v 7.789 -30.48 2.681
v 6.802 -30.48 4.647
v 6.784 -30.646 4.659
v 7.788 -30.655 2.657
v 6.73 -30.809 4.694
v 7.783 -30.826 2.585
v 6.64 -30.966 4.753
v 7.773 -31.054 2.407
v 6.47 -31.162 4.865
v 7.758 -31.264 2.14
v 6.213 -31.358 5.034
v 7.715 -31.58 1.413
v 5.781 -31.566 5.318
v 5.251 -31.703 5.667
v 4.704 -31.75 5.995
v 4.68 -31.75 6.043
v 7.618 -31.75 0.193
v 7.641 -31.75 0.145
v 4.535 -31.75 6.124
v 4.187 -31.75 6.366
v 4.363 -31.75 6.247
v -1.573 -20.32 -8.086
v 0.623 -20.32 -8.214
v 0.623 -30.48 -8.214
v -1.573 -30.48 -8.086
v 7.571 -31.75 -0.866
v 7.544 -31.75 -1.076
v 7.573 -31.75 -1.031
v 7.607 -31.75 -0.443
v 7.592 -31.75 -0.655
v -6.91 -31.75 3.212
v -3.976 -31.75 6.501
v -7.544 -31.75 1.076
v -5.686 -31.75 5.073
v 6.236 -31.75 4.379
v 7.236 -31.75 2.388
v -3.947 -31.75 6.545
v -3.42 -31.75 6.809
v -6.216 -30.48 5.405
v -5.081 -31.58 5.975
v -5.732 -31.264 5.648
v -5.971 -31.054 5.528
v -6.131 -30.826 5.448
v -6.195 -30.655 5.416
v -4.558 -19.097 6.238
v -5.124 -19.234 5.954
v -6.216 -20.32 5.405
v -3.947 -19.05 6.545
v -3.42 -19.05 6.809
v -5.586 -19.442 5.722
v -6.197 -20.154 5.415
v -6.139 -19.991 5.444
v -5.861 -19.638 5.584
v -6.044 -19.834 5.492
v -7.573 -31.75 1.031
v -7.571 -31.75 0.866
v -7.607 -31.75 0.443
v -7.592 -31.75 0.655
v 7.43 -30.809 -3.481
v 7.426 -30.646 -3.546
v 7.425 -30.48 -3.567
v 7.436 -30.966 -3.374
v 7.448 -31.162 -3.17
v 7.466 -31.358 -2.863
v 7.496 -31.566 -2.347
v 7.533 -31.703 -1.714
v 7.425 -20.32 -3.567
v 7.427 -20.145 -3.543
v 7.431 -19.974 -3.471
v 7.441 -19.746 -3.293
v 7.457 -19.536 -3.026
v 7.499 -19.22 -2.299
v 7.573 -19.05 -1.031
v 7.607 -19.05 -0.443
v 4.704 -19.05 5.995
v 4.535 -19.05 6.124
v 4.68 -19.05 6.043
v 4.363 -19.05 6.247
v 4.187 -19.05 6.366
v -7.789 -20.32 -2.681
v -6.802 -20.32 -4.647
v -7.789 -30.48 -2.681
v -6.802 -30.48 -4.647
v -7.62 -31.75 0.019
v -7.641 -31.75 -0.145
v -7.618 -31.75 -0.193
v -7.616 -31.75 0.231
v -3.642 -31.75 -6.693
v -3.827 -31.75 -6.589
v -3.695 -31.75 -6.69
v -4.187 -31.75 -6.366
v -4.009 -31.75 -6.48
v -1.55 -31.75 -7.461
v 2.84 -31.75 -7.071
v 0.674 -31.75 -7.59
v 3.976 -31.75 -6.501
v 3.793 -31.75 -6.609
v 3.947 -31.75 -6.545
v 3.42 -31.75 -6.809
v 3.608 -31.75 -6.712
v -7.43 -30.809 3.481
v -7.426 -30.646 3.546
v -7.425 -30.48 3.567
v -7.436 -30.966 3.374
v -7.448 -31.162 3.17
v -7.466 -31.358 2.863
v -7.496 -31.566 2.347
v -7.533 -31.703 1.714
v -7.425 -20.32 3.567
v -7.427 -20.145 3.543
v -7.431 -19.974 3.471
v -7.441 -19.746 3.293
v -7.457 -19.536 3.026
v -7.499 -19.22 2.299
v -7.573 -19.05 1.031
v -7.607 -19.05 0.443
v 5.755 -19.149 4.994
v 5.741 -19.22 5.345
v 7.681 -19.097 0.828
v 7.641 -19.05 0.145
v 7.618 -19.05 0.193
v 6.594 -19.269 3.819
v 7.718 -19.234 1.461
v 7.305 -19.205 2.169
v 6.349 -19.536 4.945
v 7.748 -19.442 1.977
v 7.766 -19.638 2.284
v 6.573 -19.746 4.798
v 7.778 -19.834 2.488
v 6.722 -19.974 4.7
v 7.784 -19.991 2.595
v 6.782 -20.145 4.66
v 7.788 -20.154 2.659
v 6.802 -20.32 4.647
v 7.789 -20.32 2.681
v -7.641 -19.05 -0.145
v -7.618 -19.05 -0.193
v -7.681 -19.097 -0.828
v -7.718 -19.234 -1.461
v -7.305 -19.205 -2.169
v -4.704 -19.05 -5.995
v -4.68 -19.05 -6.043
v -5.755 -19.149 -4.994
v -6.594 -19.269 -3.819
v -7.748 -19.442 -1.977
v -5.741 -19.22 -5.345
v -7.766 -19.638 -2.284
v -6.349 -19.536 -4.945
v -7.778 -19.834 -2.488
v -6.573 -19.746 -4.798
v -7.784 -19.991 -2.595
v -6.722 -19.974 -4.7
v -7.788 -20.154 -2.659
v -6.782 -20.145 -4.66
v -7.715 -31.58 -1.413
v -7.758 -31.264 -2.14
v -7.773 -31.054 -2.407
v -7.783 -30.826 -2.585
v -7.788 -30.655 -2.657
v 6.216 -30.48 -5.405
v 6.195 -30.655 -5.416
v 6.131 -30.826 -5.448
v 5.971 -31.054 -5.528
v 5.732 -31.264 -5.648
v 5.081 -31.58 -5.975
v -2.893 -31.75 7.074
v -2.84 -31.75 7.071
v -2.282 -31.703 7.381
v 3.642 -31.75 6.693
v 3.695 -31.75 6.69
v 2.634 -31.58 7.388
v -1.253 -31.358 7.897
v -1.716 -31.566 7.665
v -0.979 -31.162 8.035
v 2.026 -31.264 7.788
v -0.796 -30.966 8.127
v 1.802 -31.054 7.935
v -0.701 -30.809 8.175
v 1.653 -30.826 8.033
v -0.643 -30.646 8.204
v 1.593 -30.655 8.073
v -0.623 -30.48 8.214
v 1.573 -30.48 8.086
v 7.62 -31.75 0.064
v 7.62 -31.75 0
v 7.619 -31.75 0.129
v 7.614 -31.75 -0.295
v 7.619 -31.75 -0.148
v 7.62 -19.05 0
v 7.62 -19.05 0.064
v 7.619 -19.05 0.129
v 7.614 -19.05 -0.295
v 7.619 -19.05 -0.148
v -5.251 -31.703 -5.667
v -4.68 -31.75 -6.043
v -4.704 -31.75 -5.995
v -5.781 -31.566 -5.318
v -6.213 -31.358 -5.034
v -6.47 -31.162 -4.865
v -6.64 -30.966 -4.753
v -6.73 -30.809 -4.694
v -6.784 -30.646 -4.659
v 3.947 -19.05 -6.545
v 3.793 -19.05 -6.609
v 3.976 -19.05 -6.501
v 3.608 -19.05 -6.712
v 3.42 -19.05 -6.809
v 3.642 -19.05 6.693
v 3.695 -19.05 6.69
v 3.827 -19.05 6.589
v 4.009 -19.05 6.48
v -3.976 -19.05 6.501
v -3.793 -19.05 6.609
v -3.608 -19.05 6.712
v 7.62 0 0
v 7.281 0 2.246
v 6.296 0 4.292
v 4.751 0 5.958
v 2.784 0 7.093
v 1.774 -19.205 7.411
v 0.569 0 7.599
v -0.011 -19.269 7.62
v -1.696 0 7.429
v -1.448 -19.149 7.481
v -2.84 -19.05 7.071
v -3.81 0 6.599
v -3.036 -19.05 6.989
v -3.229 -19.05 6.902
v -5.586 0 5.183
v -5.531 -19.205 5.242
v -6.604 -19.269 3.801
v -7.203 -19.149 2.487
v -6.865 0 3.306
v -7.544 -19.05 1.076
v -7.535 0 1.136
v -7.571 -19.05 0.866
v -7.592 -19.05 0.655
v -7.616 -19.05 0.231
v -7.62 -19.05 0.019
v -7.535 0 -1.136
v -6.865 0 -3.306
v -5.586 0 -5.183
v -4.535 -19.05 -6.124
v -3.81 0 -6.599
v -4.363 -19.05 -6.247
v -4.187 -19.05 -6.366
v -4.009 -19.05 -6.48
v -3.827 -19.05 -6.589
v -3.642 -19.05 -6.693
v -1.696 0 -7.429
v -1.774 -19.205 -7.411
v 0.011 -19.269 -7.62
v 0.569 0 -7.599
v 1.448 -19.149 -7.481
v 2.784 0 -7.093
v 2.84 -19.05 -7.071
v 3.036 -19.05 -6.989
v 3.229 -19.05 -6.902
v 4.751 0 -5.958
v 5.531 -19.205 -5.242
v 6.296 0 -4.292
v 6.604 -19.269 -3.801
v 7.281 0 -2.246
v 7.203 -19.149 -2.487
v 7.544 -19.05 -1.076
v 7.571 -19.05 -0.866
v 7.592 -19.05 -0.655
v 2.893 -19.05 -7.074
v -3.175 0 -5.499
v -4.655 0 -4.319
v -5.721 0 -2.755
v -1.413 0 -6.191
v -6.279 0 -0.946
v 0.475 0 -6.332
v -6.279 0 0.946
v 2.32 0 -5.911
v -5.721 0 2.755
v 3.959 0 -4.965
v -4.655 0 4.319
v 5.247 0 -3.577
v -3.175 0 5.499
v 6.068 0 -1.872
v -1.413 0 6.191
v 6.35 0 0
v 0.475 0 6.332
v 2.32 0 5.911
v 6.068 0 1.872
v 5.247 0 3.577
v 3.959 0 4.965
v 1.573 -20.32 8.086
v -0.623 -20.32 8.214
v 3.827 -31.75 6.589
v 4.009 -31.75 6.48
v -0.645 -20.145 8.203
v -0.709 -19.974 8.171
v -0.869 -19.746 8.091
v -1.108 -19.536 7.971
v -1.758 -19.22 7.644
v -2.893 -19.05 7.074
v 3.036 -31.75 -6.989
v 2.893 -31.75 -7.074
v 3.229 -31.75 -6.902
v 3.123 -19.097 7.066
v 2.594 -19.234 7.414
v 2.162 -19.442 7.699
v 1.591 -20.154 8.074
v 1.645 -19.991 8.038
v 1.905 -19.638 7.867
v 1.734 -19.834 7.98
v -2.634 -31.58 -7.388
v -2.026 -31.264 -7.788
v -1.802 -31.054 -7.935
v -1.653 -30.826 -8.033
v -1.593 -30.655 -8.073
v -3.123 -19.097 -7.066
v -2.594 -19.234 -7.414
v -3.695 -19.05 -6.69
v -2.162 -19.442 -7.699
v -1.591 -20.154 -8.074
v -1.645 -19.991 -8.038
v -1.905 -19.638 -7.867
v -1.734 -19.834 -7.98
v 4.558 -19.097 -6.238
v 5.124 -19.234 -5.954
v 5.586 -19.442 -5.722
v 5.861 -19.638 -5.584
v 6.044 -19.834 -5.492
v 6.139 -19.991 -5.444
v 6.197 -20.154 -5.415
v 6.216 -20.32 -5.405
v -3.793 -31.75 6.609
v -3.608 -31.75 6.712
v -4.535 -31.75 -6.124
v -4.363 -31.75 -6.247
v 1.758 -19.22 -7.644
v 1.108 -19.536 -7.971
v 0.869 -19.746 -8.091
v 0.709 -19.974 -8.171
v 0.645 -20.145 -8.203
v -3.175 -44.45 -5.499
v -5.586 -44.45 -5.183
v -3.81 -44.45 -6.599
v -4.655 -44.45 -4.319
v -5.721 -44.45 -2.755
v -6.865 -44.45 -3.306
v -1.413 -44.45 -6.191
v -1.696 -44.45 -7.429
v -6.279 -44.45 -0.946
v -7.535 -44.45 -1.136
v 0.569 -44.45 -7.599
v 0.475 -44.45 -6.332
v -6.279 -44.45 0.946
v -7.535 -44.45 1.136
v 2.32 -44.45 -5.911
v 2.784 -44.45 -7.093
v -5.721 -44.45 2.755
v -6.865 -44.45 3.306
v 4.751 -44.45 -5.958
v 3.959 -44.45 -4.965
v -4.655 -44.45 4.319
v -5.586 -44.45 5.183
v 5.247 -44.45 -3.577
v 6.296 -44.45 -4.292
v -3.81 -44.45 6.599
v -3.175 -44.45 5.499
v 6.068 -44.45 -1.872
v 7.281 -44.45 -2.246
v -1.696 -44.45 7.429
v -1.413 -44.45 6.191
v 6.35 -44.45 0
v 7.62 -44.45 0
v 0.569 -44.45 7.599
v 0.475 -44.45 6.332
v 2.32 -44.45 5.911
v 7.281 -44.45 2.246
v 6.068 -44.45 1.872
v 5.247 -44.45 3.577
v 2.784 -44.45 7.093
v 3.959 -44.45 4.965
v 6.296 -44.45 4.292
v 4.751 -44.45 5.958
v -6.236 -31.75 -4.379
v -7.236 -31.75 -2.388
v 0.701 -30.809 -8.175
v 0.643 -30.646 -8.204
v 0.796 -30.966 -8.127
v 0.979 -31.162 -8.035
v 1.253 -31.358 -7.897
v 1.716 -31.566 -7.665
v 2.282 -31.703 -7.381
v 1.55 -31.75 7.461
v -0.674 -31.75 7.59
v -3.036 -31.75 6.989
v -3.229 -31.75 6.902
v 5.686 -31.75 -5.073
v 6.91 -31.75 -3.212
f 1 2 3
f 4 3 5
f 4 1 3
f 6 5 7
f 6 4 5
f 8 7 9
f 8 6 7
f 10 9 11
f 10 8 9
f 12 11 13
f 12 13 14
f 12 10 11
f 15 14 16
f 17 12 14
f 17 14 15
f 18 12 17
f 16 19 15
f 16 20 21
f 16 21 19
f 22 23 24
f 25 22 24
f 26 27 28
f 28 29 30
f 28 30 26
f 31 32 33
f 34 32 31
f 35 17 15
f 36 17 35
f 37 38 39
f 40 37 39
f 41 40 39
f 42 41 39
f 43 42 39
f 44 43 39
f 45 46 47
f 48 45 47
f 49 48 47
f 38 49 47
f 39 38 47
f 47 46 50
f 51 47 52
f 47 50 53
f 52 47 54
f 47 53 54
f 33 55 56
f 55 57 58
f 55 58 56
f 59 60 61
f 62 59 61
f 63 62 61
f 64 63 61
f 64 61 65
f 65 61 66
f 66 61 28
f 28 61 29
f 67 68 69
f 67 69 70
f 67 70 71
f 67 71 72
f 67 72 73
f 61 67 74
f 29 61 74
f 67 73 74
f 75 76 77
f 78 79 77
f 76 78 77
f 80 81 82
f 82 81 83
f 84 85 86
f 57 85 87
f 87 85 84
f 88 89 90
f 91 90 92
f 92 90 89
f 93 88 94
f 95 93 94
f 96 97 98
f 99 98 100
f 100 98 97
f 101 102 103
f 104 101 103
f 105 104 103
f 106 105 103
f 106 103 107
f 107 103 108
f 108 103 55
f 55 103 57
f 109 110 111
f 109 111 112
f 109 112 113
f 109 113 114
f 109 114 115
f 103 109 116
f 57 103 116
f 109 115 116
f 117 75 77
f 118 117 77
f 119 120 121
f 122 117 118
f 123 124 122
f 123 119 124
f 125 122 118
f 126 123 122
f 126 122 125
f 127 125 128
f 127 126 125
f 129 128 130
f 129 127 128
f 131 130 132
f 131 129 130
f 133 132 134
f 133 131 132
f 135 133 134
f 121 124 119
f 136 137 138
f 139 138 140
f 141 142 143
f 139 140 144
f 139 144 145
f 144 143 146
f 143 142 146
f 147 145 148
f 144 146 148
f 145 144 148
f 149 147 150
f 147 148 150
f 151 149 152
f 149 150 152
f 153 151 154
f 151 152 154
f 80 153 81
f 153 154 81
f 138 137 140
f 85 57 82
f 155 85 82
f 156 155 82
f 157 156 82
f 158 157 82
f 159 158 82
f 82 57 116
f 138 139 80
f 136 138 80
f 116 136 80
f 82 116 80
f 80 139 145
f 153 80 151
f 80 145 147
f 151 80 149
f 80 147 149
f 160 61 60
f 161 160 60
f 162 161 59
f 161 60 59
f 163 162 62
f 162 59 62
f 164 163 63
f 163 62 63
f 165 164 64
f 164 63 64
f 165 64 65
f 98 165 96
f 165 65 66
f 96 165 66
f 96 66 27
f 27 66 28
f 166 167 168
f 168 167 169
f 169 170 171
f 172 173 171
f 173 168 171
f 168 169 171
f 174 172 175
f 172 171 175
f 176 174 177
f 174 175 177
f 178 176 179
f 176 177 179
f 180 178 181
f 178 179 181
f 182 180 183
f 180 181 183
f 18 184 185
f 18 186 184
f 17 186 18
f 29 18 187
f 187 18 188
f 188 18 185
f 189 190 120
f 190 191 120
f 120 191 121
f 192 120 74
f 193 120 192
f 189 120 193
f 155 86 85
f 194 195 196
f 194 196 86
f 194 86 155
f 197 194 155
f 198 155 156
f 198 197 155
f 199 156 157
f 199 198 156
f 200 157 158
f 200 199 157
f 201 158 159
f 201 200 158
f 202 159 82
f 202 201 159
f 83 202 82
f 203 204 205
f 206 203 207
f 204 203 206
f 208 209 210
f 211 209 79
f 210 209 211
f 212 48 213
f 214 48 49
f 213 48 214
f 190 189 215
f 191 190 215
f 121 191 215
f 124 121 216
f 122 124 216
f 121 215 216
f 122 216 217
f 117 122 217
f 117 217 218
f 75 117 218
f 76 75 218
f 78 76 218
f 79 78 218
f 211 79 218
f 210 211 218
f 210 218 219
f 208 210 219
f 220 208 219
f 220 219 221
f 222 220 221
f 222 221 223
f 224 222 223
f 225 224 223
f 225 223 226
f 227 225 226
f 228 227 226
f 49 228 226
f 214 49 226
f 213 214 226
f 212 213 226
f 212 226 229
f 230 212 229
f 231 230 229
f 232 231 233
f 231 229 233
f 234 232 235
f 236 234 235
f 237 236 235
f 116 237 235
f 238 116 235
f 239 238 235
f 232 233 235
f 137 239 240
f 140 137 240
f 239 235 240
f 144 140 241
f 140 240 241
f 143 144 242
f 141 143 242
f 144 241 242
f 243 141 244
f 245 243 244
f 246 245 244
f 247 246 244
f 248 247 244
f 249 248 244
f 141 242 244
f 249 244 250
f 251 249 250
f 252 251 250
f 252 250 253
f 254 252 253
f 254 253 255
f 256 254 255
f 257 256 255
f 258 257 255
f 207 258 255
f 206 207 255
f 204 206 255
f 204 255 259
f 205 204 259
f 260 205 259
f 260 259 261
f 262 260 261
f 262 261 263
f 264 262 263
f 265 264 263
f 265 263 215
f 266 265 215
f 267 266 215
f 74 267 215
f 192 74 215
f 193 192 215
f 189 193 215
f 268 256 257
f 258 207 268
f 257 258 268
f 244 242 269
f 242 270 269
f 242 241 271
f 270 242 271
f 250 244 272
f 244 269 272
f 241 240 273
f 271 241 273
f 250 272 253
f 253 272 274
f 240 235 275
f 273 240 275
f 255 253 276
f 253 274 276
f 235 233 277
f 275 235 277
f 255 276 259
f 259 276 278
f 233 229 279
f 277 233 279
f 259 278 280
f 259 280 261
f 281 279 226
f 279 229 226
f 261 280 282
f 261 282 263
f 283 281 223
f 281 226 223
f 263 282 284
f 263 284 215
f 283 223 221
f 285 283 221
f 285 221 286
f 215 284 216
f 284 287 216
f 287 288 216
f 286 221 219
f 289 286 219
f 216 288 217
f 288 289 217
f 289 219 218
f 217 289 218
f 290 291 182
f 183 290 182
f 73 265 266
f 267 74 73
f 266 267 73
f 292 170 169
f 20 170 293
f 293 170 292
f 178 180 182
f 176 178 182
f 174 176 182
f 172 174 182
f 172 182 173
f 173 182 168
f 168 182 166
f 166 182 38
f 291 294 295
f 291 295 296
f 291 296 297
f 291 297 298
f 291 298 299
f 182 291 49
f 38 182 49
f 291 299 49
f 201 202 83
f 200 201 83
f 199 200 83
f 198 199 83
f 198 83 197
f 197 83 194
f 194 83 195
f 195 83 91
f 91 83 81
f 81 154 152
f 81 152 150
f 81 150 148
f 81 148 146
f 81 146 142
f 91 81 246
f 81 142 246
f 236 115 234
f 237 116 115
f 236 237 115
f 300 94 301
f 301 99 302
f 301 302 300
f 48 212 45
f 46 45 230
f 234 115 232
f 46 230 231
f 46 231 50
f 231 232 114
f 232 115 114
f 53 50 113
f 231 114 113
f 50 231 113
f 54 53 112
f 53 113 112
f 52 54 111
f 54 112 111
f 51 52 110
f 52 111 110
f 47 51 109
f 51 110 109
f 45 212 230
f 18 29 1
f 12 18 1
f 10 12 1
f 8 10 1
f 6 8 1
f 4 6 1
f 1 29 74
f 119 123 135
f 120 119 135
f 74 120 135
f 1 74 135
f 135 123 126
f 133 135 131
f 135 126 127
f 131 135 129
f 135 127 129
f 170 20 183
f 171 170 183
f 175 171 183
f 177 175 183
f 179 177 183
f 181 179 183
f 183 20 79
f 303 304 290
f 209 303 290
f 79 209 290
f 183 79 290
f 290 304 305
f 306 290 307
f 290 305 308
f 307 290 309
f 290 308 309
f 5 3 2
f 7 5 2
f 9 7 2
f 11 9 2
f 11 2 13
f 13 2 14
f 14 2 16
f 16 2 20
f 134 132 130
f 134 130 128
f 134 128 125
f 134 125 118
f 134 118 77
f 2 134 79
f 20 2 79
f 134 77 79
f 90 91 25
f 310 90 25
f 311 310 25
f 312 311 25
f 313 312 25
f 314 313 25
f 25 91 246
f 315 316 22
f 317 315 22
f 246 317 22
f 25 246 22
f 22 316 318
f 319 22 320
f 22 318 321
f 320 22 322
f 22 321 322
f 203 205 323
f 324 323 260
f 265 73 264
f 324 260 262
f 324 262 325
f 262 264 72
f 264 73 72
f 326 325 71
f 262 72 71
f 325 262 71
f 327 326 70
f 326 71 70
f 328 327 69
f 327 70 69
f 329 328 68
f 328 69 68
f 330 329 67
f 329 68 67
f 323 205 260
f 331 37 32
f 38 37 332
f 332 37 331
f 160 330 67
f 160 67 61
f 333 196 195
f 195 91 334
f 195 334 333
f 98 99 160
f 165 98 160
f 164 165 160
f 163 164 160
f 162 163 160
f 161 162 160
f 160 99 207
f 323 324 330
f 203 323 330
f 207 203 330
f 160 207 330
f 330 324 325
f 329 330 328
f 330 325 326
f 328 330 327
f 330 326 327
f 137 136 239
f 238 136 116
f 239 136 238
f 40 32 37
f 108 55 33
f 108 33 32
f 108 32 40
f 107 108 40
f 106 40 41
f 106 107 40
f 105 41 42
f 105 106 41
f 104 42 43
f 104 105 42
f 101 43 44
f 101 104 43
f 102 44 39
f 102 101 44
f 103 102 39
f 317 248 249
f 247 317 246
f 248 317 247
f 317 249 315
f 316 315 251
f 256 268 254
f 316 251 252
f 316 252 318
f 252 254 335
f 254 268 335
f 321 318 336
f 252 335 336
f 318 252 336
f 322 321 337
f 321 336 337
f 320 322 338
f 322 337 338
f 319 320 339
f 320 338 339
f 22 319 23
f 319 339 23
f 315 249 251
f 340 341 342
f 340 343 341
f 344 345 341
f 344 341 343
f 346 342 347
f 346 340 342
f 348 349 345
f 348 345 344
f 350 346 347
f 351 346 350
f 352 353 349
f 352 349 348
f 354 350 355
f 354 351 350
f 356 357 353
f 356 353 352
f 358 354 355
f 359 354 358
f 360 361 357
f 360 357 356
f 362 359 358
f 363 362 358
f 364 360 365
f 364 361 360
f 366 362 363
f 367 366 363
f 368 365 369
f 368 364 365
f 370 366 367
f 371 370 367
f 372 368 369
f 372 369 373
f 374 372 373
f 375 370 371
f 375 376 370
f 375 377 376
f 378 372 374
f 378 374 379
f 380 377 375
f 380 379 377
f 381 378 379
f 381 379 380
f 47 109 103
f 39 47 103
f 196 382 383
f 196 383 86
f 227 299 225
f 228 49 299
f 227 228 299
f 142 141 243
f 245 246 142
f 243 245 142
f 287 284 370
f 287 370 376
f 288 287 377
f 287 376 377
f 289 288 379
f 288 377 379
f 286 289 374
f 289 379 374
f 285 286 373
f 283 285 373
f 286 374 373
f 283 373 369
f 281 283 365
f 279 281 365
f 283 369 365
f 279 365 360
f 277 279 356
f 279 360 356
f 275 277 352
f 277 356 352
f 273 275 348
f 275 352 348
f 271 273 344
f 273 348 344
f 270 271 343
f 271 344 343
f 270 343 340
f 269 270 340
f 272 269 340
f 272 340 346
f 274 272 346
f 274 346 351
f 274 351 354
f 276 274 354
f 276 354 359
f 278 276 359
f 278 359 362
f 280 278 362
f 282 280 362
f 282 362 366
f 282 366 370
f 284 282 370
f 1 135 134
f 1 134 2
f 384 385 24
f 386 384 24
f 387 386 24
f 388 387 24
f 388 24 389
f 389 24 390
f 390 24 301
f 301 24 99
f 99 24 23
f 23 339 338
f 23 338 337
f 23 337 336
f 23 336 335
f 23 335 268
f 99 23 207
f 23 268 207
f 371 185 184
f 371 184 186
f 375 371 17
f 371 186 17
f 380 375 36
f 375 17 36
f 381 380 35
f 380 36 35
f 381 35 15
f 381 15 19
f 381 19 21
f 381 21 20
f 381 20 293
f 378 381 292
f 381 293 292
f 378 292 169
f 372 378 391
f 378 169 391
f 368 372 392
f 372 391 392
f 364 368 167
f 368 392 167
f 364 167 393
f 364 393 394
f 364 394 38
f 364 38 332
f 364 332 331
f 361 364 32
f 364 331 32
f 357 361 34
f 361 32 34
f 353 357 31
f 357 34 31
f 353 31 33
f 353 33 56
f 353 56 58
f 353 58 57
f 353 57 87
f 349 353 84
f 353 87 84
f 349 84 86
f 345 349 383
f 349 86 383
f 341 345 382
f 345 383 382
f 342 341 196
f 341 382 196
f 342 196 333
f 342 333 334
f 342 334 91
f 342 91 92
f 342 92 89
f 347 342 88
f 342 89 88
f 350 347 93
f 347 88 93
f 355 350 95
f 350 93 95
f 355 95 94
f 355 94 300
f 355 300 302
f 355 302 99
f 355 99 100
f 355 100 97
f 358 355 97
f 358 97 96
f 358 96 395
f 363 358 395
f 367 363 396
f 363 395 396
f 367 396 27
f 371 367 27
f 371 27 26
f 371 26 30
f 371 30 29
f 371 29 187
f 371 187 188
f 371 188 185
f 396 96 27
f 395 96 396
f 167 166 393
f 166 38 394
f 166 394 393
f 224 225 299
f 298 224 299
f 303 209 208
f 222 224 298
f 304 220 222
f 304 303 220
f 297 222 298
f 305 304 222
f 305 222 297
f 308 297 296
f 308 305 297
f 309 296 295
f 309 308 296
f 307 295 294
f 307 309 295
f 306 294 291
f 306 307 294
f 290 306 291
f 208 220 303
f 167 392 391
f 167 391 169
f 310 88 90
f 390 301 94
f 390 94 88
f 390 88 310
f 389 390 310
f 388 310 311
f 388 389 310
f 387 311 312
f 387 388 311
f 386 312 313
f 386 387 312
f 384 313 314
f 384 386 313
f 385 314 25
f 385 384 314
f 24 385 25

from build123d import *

# Parameters (mm, degrees)
F0_R         = 7.62
F1_DEPTH     = 19.05
F3_DEPTH     = 12.7
F4_SIZE      = 1.27
F5_T1_DEPTH  = 8.5497045256
F5_T3_DEPTH  = 8.5497045256
F5_T5_DEPTH  = 8.5497045256
F5_T7_DEPTH  = 8.5497045256
F5_T12_DEPTH = 8.5497045256
F5_S13_R     = 7.62
F5_T14_DEPTH = 6
F5_T18_DEPTH = 8.5497045256
F5_S19_R     = 7.62
F5_T20_DEPTH = 6
F5_T24_DEPTH = 8.5497045256
F5_S25_R     = 7.62
F5_T26_DEPTH = 6
F5_T30_DEPTH = 8.5497045256
F5_S31_R     = 7.62
F5_T32_DEPTH = 6
F5_T36_DEPTH = 8.5497045256
F5_S37_R     = 7.62
F5_T38_DEPTH = 6
F5_T42_DEPTH = 8.5497045256
F5_S43_R     = 7.62
F5_T44_DEPTH = 6
F6_R         = 7.62
F7_DEPTH     = 12.7
F8_R         = 6.35
F9_DEPTH     = 44.4510001


# Not quite as in the source:
# - a fillet or chamfer that OpenCascade refuses, or shapes differently, is made with other operations: its cross-section is extruded or revolved along the edge and cut away or added


with BuildPart() as f1:
    # F0 (on Front) → F1 (new body)
    with BuildSketch(Plane.XZ):
        Circle(F0_R)
    extrude(amount=F1_DEPTH)

    # F2 (on face) → F3 (join)
    with BuildSketch(Plane.XZ.offset(19.05)):
        with BuildLine():
            Line((7.8629215405, 3.9488814679), (4.1872753391, 6.3664059904))
            ThreePointArc((4.1872753391, 6.3664059904), (6.7071394083, 3.6164459015), (7.62, 0))
            ThreePointArc((7.62, 0), (7.616776064, -0.2216357159), (7.6071069841, -0.4430838887))
            Line((7.6071069841, -0.4430838887), (7.8629215405, 3.9488814679))
        make_face()
        with BuildLine():
            ThreePointArc((4.1872753391, 6.3664059904), (0.4430838236, 7.6071069879), (-3.4198316443, 6.8094898138))
            ThreePointArc((-3.4198316443, 6.8094898138), (-6.3664059346, 4.187275424), (-7.6071069765, 0.4430840189))
            ThreePointArc((-7.6071069765, 0.4430840189), (-6.8094898664, -3.4198315396), (-4.187275378, -6.3664059648))
            ThreePointArc((-4.187275378, -6.3664059648), (-0.4430838337, -7.6071069873), (3.419831668, -6.8094898019))
            ThreePointArc((3.419831668, -6.8094898019), (6.3664059777, -4.1872753585), (7.6071069841, -0.4430838887))
            ThreePointArc((7.6071069841, -0.4430838887), (7.616776064, -0.2216357159), (7.62, 0))
            ThreePointArc((7.62, 0), (6.7071394083, 3.6164459015), (4.1872753391, 6.3664059904))
        make_face()
        with BuildLine():
            ThreePointArc((7.6071069841, -0.4430838887), (6.3664059777, -4.1872753585), (3.419831668, -6.8094898019))
            Line((3.419831668, -6.8094898019), (7.351292438, -4.8350490681))
            Line((7.351292438, -4.8350490681), (7.6071069841, -0.4430838887))
        make_face()
        with BuildLine():
            ThreePointArc((3.419831668, -6.8094898019), (-0.4430838337, -7.6071069873), (-4.187275378, -6.3664059648))
            Line((-4.187275378, -6.3664059648), (-0.5116291025, -8.783930536))
            Line((-0.5116291025, -8.783930536), (3.419831668, -6.8094898019))
        make_face()
        with BuildLine():
            ThreePointArc((-4.187275378, -6.3664059648), (-6.8094898664, -3.4198315396), (-7.6071069765, 0.4430840189))
            Line((-7.6071069765, 0.4430840189), (-7.8629215405, -3.9488814679))
            Line((-7.8629215405, -3.9488814679), (-4.187275378, -6.3664059648))
        make_face()
        with BuildLine():
            Line((-3.4198316443, 6.8094898138), (-7.351292438, 4.8350490681))
            Line((-7.351292438, 4.8350490681), (-7.6071069765, 0.4430840189))
            ThreePointArc((-7.6071069765, 0.4430840189), (-6.3664059346, 4.187275424), (-3.4198316443, 6.8094898138))
        make_face()
        with BuildLine():
            Line((0.5116291025, 8.783930536), (-3.4198316443, 6.8094898138))
            ThreePointArc((-3.4198316443, 6.8094898138), (0.4430838236, 7.6071069879), (4.1872753391, 6.3664059904))
            Line((4.1872753391, 6.3664059904), (0.5116291025, 8.783930536))
        make_face()
    extrude(amount=F3_DEPTH)

    # F4
    f4_edges = [f1.edges().sort_by_distance(p)[0] for p in [
        (7.862922, -25.4, 3.948881),
        (7.351292, -25.4, -4.835049),
        (-0.511629, -25.4, -8.783931),
        (-7.862922, -25.4, -3.948881),
        (-7.351292, -25.4, 4.835049),
        (0.511629, -25.4, 8.783931),
    ]]
    chamfer(f4_edges, length=F4_SIZE)

    # F5: fillet of radius 1.27 on 12 edges, made by hand

    # F5_s2 → F5_t1 (cut)
    with BuildSketch(Plane(origin=(1.918540045, 0, -3.8201526101), x_dir=(0, 1, 0), z_dir=(-0.4487968068, 0, 0.8936338323))):
        with BuildLine():
            ThreePointArc((-30.48, -8.1638181024), (-31.3780256121, -7.7918437146), (-31.75, -6.8938181024))
            Line((-31.75, -6.8938181024), (-31.75, -8.1638181024))
            Line((-31.75, -8.1638181024), (-30.48, -8.1638181024))
        make_face()
        with BuildLine():
            ThreePointArc((-31.75, 6.8938181024), (-31.3780256121, 7.7918437146), (-30.48, 8.1638181024))
            Line((-30.48, 8.1638181024), (-31.75, 8.1638181024))
            Line((-31.75, 8.1638181024), (-31.75, 6.8938181024))
        make_face()
    extrude(amount=F5_T1_DEPTH, mode=Mode.SUBTRACT)

    # F5_s4 → F5_t3 (cut)
    with BuildSketch(Plane(origin=(4.2676192292, 0, -0.2485718879), x_dir=(0, 1, 0), z_dir=(-0.9983080038, 0, 0.0581474803))):
        with BuildLine():
            ThreePointArc((-31.75, -6.8938181024), (-31.3780256121, -7.7918437146), (-30.48, -8.1638181024))
            Line((-30.48, -8.1638181024), (-31.75, -8.1638181024))
            Line((-31.75, -8.1638181024), (-31.75, -6.8938181024))
        make_face()
        with BuildLine():
            ThreePointArc((-31.75, 6.8938181024), (-31.3780256121, 7.7918437146), (-30.48, 8.1638181024))
            Line((-30.48, 8.1638181024), (-31.75, 8.1638181024))
            Line((-31.75, 8.1638181024), (-31.75, 6.8938181024))
        make_face()
    extrude(amount=F5_T3_DEPTH, mode=Mode.SUBTRACT)

    # F5_s6 → F5_t5 (cut)
    with BuildSketch(Plane(origin=(-2.3490791841, 0, -3.5715807222), x_dir=(0, 1, 0), z_dir=(0.5495111971, 0, 0.835486352))):
        with BuildLine():
            ThreePointArc((-31.75, 6.8938181024), (-31.3780256121, 7.7918437146), (-30.48, 8.1638181024))
            Line((-30.48, 8.1638181024), (-31.75, 8.1638181024))
            Line((-31.75, 8.1638181024), (-31.75, 6.8938181024))
        make_face()
    extrude(amount=F5_T5_DEPTH, mode=Mode.SUBTRACT)

    # F5_s8 → F5_t7 (cut)
    with BuildSketch(Plane(origin=(2.3490791841, 0, 3.5715807222), x_dir=(0, 1, 0), z_dir=(-0.5495111971, 0, -0.835486352))):
        with BuildLine():
            ThreePointArc((-30.48, 8.1638181024), (-31.3780256121, 7.7918437146), (-31.75, 6.8938181024))
            Line((-31.75, 6.8938181024), (-31.75, 8.1638181024))
            Line((-31.75, 8.1638181024), (-30.48, 8.1638181024))
        make_face()
    extrude(amount=F5_T7_DEPTH, mode=Mode.SUBTRACT)


with BuildPart() as f5_tool10:
    # F5_s11 → F5_t12 (new body)
    with BuildSketch(Plane(origin=(4.2676192292, 0, -0.2485718879), x_dir=(0, 1, 0), z_dir=(-0.9983080038, 0, 0.0581474803))):
        with BuildLine():
            ThreePointArc((-19.05, -6.8938181024), (-19.4219743879, -7.7918437146), (-20.32, -8.1638181024))
            Line((-20.32, -8.1638181024), (-19.05, -8.1638181024))
            Line((-19.05, -8.1638181024), (-19.05, -6.8938181024))
        make_face()
    extrude(amount=F5_T12_DEPTH)

    # F5_s13 → F5_t14 (cut, symmetric)
    with BuildSketch(Plane.XZ.offset(19.7)):
        Circle(F5_S13_R)
    extrude(amount=F5_T14_DEPTH, both=True, mode=Mode.SUBTRACT)


with BuildPart() as f1_1:
    add(f1.part)

    # F5_t9: cut F5_tool10
    add(f5_tool10.part, mode=Mode.SUBTRACT)


with BuildPart() as f5_tool16:
    # F5_s17 → F5_t18 (new body)
    with BuildSketch(Plane(origin=(-2.3490791841, 0, -3.5715807222), x_dir=(0, 1, 0), z_dir=(0.5495111971, 0, 0.835486352))):
        with BuildLine():
            ThreePointArc((-19.05, 6.8938181024), (-19.4219743879, 7.7918437146), (-20.32, 8.1638181024))
            Line((-20.32, 8.1638181024), (-19.05, 8.1638181024))
            Line((-19.05, 8.1638181024), (-19.05, 6.8938181024))
        make_face()
    extrude(amount=F5_T18_DEPTH)

    # F5_s19 → F5_t20 (cut, symmetric)
    with BuildSketch(Plane.XZ.offset(19.7)):
        Circle(F5_S19_R)
    extrude(amount=F5_T20_DEPTH, both=True, mode=Mode.SUBTRACT)


with BuildPart() as f1_2:
    add(f1_1.part)

    # F5_t15: cut F5_tool16
    add(f5_tool16.part, mode=Mode.SUBTRACT)


with BuildPart() as f5_tool22:
    # F5_s23 → F5_t24 (new body)
    with BuildSketch(Plane(origin=(1.918540045, 0, -3.8201526101), x_dir=(0, 1, 0), z_dir=(-0.4487968068, 0, 0.8936338323))):
        with BuildLine():
            ThreePointArc((-19.05, 6.8938181024), (-19.4219743879, 7.7918437146), (-20.32, 8.1638181024))
            Line((-20.32, 8.1638181024), (-19.05, 8.1638181024))
            Line((-19.05, 8.1638181024), (-19.05, 6.8938181024))
        make_face()
    extrude(amount=F5_T24_DEPTH)

    # F5_s25 → F5_t26 (cut, symmetric)
    with BuildSketch(Plane.XZ.offset(19.7)):
        Circle(F5_S25_R)
    extrude(amount=F5_T26_DEPTH, both=True, mode=Mode.SUBTRACT)


with BuildPart() as f1_3:
    add(f1_2.part)

    # F5_t21: cut F5_tool22
    add(f5_tool22.part, mode=Mode.SUBTRACT)


with BuildPart() as f5_tool28:
    # F5_s29 → F5_t30 (new body)
    with BuildSketch(Plane(origin=(4.2676192292, 0, -0.2485718879), x_dir=(0, 1, 0), z_dir=(-0.9983080038, 0, 0.0581474803))):
        with BuildLine():
            ThreePointArc((-19.05, 6.8938181024), (-19.4219743879, 7.7918437146), (-20.32, 8.1638181024))
            Line((-20.32, 8.1638181024), (-19.05, 8.1638181024))
            Line((-19.05, 8.1638181024), (-19.05, 6.8938181024))
        make_face()
    extrude(amount=F5_T30_DEPTH)

    # F5_s31 → F5_t32 (cut, symmetric)
    with BuildSketch(Plane.XZ.offset(19.7)):
        Circle(F5_S31_R)
    extrude(amount=F5_T32_DEPTH, both=True, mode=Mode.SUBTRACT)


with BuildPart() as f1_4:
    add(f1_3.part)

    # F5_t27: cut F5_tool28
    add(f5_tool28.part, mode=Mode.SUBTRACT)


with BuildPart() as f5_tool34:
    # F5_s35 → F5_t36 (new body)
    with BuildSketch(Plane(origin=(2.3490791841, 0, 3.5715807222), x_dir=(0, 1, 0), z_dir=(-0.5495111971, 0, -0.835486352))):
        with BuildLine():
            ThreePointArc((-19.05, 6.8938181024), (-19.4219743879, 7.7918437146), (-20.32, 8.1638181024))
            Line((-20.32, 8.1638181024), (-19.05, 8.1638181024))
            Line((-19.05, 8.1638181024), (-19.05, 6.8938181024))
        make_face()
    extrude(amount=F5_T36_DEPTH)

    # F5_s37 → F5_t38 (cut, symmetric)
    with BuildSketch(Plane.XZ.offset(19.7)):
        Circle(F5_S37_R)
    extrude(amount=F5_T38_DEPTH, both=True, mode=Mode.SUBTRACT)


with BuildPart() as f1_5:
    add(f1_4.part)

    # F5_t33: cut F5_tool34
    add(f5_tool34.part, mode=Mode.SUBTRACT)


with BuildPart() as f5_tool40:
    # F5_s41 → F5_t42 (new body)
    with BuildSketch(Plane(origin=(1.918540045, 0, -3.8201526101), x_dir=(0, 1, 0), z_dir=(-0.4487968068, 0, 0.8936338323))):
        with BuildLine():
            ThreePointArc((-19.05, -6.8938181024), (-19.4219743879, -7.7918437146), (-20.32, -8.1638181024))
            Line((-20.32, -8.1638181024), (-19.05, -8.1638181024))
            Line((-19.05, -8.1638181024), (-19.05, -6.8938181024))
        make_face()
    extrude(amount=F5_T42_DEPTH)

    # F5_s43 → F5_t44 (cut, symmetric)
    with BuildSketch(Plane.XZ.offset(19.7)):
        Circle(F5_S43_R)
    extrude(amount=F5_T44_DEPTH, both=True, mode=Mode.SUBTRACT)


with BuildPart() as f1_6:
    add(f1_5.part)

    # F5_t39: cut F5_tool40
    add(f5_tool40.part, mode=Mode.SUBTRACT)

    # F6 (on face) → F7 (join)
    with BuildSketch(Plane.XZ.offset(31.75)):
        Circle(F6_R)
    extrude(amount=F7_DEPTH)

    # F8 (on face) → F9 (cut, through all)
    with BuildSketch(Plane.XZ.offset(44.45)):
        Circle(F8_R)
    extrude(amount=-F9_DEPTH, mode=Mode.SUBTRACT)


solid = f1_6.part
